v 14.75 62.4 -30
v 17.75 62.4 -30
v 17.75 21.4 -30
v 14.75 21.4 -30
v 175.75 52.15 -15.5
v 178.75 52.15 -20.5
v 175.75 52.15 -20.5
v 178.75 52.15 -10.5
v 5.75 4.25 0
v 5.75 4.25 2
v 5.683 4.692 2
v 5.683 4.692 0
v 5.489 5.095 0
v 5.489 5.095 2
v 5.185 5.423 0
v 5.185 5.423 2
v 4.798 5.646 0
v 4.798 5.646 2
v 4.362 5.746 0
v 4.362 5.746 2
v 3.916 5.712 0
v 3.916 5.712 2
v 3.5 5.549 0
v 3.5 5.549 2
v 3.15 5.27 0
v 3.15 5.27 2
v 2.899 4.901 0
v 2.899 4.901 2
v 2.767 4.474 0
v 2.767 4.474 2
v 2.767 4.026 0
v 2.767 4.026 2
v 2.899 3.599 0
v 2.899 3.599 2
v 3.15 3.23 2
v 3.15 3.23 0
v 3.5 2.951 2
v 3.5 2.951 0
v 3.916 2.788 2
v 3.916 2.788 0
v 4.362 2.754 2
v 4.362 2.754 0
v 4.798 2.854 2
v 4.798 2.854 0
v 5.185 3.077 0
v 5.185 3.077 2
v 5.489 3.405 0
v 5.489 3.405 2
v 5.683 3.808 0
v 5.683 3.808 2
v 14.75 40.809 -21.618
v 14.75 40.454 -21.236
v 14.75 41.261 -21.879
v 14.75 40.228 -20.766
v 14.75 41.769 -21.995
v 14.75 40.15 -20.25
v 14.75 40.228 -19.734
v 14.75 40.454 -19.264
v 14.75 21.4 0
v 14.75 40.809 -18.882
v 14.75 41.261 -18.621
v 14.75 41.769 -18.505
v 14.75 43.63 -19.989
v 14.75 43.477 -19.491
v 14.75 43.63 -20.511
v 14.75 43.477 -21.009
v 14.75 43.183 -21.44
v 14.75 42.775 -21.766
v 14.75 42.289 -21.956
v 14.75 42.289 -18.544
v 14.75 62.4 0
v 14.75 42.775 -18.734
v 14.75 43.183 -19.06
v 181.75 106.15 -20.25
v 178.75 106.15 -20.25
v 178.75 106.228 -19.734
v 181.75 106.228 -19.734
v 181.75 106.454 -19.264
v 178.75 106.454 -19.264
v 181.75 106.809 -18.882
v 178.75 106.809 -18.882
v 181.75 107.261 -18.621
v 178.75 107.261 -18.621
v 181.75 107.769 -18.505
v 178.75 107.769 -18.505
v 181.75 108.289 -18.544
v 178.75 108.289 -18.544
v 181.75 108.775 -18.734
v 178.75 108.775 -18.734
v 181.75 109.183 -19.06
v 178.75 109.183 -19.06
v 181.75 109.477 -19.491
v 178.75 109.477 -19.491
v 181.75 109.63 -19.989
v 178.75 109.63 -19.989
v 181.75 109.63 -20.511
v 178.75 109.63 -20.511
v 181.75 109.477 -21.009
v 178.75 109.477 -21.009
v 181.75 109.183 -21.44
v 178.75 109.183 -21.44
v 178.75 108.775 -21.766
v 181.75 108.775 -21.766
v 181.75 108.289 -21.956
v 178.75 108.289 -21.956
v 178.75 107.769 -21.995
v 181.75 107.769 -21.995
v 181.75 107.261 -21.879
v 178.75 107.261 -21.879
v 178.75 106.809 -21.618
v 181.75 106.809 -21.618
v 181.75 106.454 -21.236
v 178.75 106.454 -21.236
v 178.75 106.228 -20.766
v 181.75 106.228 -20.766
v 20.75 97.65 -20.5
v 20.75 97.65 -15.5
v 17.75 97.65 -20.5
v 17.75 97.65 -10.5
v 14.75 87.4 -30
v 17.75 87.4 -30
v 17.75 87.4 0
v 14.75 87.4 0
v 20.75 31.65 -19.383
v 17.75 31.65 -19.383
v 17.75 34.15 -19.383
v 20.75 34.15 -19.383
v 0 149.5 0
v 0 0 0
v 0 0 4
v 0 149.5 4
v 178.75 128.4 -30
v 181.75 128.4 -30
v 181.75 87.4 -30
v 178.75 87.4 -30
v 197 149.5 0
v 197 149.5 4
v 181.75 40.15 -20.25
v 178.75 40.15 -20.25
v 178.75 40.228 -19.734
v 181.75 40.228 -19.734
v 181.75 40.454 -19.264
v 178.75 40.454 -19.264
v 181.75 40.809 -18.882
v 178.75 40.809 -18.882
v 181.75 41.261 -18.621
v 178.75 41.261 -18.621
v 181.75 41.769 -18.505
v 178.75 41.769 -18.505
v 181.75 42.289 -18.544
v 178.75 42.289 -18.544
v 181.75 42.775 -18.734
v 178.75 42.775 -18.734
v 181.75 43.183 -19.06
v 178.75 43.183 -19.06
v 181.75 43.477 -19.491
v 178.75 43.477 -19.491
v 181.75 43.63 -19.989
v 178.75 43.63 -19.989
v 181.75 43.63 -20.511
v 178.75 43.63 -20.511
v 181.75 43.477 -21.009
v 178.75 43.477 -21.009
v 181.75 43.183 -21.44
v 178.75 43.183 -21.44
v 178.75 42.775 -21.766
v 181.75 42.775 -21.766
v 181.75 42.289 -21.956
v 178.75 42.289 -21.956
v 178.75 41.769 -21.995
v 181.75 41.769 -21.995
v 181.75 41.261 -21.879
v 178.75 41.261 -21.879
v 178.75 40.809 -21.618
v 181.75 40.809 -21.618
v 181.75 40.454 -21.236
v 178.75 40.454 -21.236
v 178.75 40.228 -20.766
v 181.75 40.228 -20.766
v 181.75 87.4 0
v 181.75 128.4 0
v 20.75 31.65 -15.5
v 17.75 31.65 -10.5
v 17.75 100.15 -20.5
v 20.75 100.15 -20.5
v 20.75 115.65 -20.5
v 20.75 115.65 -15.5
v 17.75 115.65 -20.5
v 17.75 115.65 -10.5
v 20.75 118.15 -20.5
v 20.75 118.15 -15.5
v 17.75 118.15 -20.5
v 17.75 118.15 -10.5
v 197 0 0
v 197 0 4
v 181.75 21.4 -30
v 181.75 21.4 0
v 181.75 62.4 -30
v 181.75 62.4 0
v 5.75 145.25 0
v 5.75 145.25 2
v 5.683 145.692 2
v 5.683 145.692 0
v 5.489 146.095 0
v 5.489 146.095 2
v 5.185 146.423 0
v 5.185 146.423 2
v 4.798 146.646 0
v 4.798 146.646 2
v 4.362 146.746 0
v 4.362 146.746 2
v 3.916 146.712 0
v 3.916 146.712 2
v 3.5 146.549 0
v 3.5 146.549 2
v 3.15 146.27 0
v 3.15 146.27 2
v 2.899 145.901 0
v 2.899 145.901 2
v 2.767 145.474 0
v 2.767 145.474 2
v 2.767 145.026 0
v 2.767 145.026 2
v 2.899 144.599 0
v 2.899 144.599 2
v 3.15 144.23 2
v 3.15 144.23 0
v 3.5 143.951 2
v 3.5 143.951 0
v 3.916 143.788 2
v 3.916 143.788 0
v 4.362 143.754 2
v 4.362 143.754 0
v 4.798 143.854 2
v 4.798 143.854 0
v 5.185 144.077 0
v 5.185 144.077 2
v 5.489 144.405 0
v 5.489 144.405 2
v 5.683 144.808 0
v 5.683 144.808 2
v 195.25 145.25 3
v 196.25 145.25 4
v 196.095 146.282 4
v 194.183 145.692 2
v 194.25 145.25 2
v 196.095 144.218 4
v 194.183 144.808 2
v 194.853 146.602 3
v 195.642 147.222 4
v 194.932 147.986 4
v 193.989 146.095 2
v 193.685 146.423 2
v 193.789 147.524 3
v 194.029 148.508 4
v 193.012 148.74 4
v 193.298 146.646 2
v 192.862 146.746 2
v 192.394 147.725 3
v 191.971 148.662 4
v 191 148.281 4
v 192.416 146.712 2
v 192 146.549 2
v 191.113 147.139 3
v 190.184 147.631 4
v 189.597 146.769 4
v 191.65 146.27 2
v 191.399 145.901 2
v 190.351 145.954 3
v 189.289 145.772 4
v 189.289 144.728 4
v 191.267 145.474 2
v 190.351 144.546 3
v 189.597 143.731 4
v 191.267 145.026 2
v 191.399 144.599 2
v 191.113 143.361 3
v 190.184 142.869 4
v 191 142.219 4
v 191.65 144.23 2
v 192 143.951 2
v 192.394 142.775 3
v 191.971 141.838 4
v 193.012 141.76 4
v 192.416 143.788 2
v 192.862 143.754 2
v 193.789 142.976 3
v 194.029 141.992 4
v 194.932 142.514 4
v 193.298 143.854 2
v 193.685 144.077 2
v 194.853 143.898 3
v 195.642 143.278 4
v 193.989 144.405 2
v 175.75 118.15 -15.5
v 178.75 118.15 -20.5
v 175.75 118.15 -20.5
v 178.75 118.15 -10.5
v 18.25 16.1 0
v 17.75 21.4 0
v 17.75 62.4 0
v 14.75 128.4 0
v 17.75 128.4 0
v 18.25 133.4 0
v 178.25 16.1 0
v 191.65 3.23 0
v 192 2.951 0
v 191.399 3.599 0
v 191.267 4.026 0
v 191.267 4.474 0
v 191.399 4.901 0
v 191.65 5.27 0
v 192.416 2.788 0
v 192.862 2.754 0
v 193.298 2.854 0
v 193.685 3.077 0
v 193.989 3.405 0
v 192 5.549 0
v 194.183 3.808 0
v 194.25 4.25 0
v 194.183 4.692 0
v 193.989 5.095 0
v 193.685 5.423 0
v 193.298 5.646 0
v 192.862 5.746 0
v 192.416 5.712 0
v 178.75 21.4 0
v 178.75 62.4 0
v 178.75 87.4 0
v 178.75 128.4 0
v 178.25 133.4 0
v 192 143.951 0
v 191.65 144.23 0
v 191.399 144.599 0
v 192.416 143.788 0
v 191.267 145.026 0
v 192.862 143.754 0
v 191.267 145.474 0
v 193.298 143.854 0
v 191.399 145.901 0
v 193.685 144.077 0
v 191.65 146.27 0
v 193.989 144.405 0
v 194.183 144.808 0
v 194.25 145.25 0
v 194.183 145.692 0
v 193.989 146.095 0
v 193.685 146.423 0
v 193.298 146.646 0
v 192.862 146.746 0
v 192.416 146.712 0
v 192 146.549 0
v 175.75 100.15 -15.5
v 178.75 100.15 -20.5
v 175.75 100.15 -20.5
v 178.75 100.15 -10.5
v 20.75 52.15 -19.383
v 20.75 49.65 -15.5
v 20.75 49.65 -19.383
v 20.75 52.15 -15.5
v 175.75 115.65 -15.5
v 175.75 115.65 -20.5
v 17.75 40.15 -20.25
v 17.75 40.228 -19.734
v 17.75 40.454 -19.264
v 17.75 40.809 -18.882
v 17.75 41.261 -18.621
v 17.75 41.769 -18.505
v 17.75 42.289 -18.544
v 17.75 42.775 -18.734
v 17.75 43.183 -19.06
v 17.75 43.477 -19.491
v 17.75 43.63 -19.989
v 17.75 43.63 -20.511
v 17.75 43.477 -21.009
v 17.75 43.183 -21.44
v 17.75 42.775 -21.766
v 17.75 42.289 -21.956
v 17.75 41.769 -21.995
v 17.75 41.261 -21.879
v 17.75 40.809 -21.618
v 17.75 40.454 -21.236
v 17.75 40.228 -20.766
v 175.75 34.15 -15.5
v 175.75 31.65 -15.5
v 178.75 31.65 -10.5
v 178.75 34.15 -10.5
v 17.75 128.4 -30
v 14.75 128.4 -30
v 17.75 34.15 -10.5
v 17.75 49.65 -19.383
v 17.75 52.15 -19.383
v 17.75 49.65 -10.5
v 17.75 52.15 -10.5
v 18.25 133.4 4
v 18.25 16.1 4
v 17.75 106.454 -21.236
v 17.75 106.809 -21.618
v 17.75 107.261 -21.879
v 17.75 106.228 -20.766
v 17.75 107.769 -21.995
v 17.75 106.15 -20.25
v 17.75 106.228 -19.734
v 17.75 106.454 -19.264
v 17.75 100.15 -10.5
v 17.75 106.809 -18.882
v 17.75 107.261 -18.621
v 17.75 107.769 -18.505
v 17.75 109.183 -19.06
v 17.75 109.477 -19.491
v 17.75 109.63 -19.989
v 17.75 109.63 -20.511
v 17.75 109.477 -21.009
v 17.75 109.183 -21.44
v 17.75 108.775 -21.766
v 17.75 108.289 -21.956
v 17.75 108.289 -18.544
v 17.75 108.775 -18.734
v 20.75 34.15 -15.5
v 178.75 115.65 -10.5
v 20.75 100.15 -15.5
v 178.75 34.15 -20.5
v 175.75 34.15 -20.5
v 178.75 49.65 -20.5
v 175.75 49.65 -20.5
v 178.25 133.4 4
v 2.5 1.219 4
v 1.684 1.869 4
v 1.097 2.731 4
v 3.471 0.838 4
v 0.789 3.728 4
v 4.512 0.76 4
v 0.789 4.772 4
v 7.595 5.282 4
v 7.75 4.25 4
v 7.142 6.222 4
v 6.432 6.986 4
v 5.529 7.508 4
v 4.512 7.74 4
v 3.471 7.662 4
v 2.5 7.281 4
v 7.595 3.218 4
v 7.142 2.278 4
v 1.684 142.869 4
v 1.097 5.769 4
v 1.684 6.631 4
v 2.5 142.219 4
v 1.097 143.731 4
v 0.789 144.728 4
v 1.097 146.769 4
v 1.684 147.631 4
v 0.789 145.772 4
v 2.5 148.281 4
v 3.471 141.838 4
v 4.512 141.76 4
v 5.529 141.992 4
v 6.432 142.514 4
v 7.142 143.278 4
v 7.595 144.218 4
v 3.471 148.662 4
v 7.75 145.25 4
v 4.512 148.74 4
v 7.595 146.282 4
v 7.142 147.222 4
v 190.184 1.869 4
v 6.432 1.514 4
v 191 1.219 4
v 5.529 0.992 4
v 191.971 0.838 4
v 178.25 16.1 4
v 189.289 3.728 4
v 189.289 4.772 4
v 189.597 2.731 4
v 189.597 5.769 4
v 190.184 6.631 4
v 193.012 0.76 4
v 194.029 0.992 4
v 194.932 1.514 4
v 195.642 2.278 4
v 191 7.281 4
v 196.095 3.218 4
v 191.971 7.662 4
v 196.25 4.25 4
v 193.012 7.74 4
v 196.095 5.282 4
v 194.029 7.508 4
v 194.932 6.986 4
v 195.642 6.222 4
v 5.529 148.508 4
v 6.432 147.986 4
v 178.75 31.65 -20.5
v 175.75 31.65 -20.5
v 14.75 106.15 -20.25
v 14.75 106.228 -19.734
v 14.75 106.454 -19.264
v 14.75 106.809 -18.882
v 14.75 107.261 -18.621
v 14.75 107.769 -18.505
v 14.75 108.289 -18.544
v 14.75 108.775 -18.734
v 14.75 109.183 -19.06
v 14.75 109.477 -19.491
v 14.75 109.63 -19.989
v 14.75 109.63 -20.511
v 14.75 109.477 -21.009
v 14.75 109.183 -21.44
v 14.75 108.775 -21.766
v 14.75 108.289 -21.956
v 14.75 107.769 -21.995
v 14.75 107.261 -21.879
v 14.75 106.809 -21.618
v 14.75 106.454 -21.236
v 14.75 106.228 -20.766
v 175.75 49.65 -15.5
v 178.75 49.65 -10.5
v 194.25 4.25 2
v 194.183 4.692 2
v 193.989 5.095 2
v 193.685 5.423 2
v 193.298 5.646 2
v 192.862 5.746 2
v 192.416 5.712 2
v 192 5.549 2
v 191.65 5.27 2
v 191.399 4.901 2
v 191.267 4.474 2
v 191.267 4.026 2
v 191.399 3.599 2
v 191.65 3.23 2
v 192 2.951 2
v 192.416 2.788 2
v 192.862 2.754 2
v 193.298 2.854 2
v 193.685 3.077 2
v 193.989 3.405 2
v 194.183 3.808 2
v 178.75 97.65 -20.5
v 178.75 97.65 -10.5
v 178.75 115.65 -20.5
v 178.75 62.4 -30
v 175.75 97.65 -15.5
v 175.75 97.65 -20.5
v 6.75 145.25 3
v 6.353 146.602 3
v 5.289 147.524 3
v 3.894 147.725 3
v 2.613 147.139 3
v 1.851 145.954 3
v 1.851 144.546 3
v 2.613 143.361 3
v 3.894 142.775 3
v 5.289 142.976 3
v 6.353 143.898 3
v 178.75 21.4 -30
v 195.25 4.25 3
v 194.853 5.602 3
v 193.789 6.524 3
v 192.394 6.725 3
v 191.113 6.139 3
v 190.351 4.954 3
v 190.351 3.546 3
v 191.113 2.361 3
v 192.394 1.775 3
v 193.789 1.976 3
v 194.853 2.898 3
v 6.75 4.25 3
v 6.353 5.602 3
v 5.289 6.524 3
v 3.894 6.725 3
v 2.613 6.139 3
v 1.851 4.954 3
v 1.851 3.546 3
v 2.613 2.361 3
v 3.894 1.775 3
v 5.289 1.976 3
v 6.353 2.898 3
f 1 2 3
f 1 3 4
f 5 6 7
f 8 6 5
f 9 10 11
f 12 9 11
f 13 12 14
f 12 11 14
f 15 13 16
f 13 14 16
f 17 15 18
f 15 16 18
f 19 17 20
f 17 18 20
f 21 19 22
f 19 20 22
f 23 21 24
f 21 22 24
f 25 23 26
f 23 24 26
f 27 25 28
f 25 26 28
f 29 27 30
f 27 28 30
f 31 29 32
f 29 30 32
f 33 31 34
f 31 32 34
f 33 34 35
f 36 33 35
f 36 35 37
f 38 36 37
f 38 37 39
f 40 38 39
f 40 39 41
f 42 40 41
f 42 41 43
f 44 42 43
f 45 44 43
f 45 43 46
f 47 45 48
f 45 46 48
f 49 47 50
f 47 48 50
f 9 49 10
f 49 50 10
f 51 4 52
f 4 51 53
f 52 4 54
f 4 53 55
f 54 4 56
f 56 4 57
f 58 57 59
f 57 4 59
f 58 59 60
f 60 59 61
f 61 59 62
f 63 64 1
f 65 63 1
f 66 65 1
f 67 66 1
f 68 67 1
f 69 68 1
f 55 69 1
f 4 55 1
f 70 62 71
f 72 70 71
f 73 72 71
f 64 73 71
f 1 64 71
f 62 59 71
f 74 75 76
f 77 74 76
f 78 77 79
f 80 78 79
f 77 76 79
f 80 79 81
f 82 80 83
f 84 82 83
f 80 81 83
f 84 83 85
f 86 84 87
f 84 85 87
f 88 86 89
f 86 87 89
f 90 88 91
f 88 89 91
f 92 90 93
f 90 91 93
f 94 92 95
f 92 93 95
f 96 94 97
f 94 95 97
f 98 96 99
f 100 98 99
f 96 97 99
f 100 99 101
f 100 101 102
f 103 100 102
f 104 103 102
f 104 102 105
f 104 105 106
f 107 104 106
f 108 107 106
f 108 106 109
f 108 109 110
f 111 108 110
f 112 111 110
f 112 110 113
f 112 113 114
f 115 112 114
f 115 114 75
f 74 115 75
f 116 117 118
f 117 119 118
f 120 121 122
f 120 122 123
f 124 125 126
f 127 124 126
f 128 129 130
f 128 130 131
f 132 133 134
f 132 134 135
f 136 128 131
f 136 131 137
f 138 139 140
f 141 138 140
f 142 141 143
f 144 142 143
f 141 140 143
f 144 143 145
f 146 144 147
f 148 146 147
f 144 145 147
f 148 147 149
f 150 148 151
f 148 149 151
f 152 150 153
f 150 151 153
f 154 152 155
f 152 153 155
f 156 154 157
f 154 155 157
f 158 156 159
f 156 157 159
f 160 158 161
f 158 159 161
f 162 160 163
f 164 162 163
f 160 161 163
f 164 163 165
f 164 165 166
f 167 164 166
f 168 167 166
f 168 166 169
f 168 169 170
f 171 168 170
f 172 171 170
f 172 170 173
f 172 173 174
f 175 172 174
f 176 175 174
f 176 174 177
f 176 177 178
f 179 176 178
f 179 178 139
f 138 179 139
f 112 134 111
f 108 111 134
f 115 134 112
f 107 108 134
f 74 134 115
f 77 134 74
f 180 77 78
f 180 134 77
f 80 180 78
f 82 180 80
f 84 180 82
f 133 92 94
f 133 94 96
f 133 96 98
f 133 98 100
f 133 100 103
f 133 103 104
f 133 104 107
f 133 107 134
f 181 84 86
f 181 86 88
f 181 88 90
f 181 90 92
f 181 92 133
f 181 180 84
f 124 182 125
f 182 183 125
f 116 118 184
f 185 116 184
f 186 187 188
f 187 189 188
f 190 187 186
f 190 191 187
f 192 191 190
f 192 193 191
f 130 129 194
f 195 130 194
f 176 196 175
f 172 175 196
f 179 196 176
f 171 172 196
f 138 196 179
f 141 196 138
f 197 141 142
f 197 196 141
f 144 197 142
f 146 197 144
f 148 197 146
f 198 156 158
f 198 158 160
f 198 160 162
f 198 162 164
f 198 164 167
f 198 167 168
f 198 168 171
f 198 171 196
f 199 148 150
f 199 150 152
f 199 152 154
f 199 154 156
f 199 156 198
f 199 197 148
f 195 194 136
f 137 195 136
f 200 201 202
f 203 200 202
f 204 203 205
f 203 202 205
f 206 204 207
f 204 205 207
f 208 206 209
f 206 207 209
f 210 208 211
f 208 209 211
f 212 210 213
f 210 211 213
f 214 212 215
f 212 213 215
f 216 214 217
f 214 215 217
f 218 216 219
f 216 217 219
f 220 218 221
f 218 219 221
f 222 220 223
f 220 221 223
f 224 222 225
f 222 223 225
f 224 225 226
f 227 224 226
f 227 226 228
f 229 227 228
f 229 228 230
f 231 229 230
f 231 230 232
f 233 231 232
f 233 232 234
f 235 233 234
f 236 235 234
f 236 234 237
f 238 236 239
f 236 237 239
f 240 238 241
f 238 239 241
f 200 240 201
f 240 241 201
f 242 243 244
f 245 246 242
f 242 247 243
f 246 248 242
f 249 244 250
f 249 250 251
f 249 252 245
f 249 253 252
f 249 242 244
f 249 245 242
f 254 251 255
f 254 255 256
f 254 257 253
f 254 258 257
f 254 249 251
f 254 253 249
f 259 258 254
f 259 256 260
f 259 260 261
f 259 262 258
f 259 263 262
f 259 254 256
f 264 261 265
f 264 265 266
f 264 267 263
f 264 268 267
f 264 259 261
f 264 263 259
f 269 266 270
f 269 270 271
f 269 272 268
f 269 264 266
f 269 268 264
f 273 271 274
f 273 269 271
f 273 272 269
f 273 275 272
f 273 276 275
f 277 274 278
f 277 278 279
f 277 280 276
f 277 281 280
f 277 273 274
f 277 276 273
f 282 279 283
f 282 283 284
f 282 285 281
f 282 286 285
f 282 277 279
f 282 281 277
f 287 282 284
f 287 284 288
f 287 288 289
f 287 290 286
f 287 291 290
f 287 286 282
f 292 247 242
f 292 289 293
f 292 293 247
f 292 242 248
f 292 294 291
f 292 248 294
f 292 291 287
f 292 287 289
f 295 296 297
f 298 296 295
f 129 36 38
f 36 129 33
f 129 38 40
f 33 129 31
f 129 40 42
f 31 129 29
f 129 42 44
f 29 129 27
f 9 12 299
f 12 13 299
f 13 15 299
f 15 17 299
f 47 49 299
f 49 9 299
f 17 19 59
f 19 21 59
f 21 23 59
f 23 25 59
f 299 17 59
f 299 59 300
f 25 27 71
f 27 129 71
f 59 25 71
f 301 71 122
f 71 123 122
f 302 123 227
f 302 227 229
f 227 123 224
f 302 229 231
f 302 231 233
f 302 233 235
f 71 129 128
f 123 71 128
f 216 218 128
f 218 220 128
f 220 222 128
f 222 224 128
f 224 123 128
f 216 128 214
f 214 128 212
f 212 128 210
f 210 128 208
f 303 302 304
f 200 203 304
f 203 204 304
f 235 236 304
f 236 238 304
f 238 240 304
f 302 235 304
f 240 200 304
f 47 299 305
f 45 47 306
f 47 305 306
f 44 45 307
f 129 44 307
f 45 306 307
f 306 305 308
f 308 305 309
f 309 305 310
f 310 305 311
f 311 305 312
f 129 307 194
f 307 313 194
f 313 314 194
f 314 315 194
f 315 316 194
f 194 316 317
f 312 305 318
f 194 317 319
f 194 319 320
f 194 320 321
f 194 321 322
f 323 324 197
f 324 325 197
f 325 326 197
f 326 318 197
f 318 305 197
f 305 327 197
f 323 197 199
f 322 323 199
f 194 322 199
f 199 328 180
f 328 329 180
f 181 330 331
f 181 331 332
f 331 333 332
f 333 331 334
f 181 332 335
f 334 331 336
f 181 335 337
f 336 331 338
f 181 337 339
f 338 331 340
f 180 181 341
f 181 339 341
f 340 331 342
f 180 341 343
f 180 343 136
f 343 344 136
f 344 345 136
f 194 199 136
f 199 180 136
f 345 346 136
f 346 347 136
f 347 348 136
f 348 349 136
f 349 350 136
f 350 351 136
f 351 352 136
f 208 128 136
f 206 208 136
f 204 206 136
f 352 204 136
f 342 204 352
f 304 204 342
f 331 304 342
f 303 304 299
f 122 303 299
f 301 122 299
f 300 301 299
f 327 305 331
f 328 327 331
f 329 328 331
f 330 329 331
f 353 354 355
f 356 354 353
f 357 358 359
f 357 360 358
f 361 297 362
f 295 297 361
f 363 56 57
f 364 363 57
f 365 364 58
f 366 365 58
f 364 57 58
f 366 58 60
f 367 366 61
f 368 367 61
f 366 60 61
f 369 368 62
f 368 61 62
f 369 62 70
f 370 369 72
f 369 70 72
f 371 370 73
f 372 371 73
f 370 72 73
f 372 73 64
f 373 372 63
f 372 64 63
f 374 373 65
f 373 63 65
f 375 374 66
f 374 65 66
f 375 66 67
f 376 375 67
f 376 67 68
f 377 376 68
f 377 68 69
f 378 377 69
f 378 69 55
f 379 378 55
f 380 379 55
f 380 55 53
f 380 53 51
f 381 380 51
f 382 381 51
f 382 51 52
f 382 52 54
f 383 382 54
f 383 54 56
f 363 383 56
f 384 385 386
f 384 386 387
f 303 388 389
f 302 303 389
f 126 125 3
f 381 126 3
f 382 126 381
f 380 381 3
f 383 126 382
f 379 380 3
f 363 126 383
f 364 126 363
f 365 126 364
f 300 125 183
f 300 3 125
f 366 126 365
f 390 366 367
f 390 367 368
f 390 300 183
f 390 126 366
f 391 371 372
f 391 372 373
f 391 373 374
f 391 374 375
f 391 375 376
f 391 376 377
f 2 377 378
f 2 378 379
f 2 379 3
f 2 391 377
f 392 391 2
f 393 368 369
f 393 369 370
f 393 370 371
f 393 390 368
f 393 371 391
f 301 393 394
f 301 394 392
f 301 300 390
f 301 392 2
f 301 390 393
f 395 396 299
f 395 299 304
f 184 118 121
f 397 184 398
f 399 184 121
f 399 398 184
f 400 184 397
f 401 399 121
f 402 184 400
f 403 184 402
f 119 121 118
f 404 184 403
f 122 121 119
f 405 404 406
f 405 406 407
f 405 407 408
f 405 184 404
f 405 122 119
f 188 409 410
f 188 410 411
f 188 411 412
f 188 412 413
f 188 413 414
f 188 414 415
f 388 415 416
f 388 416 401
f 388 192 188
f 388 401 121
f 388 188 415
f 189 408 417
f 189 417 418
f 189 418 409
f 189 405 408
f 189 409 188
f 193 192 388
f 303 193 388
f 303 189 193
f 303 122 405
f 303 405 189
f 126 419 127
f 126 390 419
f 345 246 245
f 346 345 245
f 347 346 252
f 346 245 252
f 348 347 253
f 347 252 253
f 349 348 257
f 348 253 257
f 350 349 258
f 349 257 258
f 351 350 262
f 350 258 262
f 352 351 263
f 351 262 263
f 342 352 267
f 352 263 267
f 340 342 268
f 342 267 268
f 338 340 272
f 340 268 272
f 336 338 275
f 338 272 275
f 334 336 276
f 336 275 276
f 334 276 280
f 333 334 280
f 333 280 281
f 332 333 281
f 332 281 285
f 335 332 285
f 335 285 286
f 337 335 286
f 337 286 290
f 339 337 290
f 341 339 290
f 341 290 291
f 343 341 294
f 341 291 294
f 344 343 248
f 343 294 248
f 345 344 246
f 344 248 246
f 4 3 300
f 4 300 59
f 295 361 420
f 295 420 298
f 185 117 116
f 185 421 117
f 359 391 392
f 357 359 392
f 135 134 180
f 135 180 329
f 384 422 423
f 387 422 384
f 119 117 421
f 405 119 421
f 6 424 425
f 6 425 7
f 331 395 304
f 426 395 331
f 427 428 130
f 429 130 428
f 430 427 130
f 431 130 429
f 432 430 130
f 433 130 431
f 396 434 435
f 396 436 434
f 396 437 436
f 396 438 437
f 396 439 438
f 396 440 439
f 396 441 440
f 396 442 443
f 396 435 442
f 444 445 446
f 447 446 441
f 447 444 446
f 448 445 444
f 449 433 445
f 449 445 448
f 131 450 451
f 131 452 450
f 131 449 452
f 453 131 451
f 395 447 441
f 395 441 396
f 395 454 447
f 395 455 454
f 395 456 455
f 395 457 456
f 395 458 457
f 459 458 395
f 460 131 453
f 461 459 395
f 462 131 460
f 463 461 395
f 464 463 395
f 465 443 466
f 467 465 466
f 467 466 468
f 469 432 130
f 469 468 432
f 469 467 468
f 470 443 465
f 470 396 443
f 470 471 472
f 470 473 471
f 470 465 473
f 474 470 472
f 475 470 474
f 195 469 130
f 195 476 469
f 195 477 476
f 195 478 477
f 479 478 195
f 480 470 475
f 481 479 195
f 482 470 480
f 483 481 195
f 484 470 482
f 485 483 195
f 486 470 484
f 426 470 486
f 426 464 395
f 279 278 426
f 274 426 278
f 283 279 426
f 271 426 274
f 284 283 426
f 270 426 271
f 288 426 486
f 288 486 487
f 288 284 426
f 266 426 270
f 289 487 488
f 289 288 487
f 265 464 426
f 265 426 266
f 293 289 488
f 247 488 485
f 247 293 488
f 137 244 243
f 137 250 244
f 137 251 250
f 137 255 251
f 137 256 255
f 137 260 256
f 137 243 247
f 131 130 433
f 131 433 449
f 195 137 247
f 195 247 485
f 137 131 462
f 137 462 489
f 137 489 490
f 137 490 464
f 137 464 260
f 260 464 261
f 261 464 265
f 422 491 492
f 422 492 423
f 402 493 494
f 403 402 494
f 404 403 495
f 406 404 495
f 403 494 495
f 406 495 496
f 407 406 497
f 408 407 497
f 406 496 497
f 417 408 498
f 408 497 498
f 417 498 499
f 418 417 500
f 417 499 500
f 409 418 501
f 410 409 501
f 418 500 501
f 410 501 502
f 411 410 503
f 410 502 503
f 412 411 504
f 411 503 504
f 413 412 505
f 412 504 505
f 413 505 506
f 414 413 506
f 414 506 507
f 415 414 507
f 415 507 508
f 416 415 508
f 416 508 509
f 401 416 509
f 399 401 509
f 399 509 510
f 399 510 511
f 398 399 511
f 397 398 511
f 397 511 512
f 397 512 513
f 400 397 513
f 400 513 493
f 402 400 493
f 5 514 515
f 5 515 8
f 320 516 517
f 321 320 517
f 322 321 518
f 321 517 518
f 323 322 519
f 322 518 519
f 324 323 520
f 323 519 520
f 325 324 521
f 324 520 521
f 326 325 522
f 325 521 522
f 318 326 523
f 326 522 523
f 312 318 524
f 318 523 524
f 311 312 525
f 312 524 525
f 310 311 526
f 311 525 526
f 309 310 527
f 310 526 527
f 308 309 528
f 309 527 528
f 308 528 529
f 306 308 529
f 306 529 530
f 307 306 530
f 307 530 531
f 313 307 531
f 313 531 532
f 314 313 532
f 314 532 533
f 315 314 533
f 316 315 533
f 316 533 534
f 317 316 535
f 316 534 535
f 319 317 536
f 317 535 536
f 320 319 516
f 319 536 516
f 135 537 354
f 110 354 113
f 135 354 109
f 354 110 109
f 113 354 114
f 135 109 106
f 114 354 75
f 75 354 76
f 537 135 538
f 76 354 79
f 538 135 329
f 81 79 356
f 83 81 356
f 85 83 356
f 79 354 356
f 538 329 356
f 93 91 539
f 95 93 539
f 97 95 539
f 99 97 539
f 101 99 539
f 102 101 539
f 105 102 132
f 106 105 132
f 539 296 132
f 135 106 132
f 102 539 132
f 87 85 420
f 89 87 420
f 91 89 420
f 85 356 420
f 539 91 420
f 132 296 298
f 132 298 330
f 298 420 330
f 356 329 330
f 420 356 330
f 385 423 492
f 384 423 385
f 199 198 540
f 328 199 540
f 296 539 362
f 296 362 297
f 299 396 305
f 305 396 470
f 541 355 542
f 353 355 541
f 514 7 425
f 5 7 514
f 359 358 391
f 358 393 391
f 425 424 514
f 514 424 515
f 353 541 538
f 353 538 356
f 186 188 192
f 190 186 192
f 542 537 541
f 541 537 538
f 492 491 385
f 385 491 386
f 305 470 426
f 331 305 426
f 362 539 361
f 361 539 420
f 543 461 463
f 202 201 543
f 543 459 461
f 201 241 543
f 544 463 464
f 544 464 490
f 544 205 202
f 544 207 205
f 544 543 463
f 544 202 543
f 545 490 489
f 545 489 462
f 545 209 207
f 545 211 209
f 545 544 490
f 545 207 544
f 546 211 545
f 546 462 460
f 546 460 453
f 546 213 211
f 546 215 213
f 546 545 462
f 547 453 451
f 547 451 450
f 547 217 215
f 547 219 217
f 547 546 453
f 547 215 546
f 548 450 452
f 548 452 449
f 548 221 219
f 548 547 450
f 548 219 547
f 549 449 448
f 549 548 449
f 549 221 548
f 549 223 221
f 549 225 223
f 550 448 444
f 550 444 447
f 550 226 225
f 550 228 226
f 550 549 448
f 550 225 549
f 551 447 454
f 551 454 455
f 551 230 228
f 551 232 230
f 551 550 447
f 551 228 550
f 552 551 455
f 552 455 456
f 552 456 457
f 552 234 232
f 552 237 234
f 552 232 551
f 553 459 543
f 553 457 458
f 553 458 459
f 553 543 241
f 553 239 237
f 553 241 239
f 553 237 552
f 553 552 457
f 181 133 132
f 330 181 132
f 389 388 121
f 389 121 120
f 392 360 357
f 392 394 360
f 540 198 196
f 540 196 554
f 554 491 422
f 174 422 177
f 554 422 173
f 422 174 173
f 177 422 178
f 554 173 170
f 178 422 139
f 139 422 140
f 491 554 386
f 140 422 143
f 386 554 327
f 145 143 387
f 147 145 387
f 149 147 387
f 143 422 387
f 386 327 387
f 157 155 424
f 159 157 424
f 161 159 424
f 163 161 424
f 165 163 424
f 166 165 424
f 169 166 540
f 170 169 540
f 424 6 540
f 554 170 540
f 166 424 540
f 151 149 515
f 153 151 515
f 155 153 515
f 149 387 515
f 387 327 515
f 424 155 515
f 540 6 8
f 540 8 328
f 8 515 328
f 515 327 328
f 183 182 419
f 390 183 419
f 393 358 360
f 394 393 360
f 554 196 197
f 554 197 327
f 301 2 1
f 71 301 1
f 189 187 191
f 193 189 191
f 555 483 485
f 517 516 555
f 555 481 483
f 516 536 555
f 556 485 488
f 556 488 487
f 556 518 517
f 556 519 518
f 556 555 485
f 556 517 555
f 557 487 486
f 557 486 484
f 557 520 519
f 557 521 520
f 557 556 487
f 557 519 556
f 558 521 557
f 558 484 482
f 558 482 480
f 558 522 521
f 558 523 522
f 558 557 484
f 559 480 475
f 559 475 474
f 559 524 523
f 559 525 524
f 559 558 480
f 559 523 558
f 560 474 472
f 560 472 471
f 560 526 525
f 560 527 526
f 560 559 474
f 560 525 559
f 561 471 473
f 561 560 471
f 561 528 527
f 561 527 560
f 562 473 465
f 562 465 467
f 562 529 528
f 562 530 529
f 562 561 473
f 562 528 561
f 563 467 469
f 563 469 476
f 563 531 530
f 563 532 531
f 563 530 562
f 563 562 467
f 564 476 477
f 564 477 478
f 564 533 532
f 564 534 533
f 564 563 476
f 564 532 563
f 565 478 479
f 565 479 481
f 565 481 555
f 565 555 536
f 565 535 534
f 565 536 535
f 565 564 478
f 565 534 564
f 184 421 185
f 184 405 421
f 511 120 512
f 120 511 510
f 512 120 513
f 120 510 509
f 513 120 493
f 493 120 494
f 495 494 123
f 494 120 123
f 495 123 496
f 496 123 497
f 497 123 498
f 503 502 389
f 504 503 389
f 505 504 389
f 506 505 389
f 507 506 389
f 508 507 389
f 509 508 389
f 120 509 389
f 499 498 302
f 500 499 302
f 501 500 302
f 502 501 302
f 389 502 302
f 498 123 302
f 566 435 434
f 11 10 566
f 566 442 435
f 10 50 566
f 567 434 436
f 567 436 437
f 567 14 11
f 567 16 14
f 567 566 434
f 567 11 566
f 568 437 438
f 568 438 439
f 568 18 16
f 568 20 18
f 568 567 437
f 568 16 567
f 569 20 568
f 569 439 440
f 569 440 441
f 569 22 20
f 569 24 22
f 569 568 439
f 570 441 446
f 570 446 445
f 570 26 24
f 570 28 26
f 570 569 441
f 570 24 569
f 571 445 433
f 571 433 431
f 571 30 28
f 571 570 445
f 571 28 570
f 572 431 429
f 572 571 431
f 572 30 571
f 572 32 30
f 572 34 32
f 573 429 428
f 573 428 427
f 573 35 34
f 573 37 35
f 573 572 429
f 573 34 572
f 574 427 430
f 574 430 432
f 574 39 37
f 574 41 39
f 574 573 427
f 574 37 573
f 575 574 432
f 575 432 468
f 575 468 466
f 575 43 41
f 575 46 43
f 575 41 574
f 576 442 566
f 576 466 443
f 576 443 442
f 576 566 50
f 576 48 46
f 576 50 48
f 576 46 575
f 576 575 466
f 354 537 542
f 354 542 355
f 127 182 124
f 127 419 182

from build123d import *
from OCP.BRepFilletAPI import BRepFilletAPI_MakeChamfer

# Parameters (mm, degrees)
ESQUISSE1_W             = 197
ESQUISSE1_H             = 149.5
BOSS_EXTRU_1_DEPTH      = 4
ESQUISSE3_R             = 1.5
ENL_V_MAT_EXTRU_2_DEPTH = 4
CHANFREIN1_SIZE         = 2
ESQUISSE4_W             = 160
ESQUISSE4_H             = 117.3
ENL_V_MAT_EXTRU_3_DEPTH = 10
ESQUISSE5_W             = 3
ESQUISSE5_H             = 41
BOSS_EXTRU_2_DEPTH      = 30
ESQUISSE6_W             = 10
ESQUISSE6_H             = 2.5
ESQUISSE6_W_2           = 8.882781921
BOSS_EXTRU_3_DEPTH      = 3
ESQUISSE7_W             = 10
ESQUISSE7_H             = 2.5
BOSS_EXTRU_4_DEPTH      = 3
CHANFREIN2_SIZE         = 3
CHANFREIN2_SIZE_2       = 5
ESQUISSE8_R             = 1.75
ENL_V_MAT_EXTRU_4_DEPTH = 210


with BuildPart() as part:
    # Esquisse1 → Boss.-Extru.1 (new body)
    with BuildSketch(Plane.XY):
        with Locations((98.5, 74.75)):
            Rectangle(ESQUISSE1_W, ESQUISSE1_H)
    extrude(amount=BOSS_EXTRU_1_DEPTH)

    # Esquisse3 → Enlèv. mat.-Extru.2 (cut)
    with BuildSketch(Plane.XY.offset(4)):
        with Locations((4.25, 145.25)):
            Circle(ESQUISSE3_R)
        with Locations((4.25, 4.25)):
            Circle(ESQUISSE3_R)
        with Locations((192.75, 4.25)):
            Circle(ESQUISSE3_R)
        with Locations((192.75, 145.25)):
            Circle(ESQUISSE3_R)
    extrude(amount=-ENL_V_MAT_EXTRU_2_DEPTH, mode=Mode.SUBTRACT)

    # Chanfrein1
    chanfrein1_edges = [part.edges().sort_by_distance(p)[0] for p in [
        (2.75, 145.25, 4),
        (2.75, 4.25, 4),
        (191.25, 4.25, 4),
        (191.25, 145.25, 4),
    ]]
    chamfer(chanfrein1_edges, length=CHANFREIN1_SIZE)

    # Esquisse4 → Enlèv. mat.-Extru.3 (cut)
    with BuildSketch(Plane.XY.offset(4)):
        with Locations((98.25, 74.75)):
            Rectangle(ESQUISSE4_W, ESQUISSE4_H)
    extrude(amount=-ENL_V_MAT_EXTRU_3_DEPTH, mode=Mode.SUBTRACT)

    # Esquisse5 → Boss.-Extru.2 (add)
    with BuildSketch(Plane(origin=(0, 0, 0), x_dir=(-1, 0, 0), z_dir=(0, 0, -1))):
        with Locations((-180.25, 107.9)):
            Rectangle(ESQUISSE5_W, ESQUISSE5_H)
        with Locations((-180.25, 41.9)):
            Rectangle(ESQUISSE5_W, ESQUISSE5_H)
        with Locations((-16.25, 107.9)):
            Rectangle(ESQUISSE5_W, ESQUISSE5_H)
        with Locations((-16.25, 41.9)):
            Rectangle(ESQUISSE5_W, ESQUISSE5_H)
    extrude(amount=BOSS_EXTRU_2_DEPTH)

    # Esquisse6 → Boss.-Extru.3 (add)
    with BuildSketch(Plane(origin=(17.75, 0, 0), x_dir=(0, 0, -1), z_dir=(1, 0, 0))):
        with Locations((15.5, 116.9)):
            Rectangle(ESQUISSE6_W, ESQUISSE6_H)
        with Locations((15.5, 98.9)):
            Rectangle(ESQUISSE6_W, ESQUISSE6_H)
        with Locations((14.941390961, 50.9)):
            Rectangle(ESQUISSE6_W_2, ESQUISSE6_H)
        with Locations((14.941390961, 32.9)):
            Rectangle(ESQUISSE6_W_2, ESQUISSE6_H)
    extrude(amount=BOSS_EXTRU_3_DEPTH)

    # Esquisse7 → Boss.-Extru.4 (add)
    with BuildSketch(Plane.ZY.offset(-178.75)):
        with Locations((-15.5, 32.9)):
            Rectangle(ESQUISSE7_W, ESQUISSE7_H)
        with Locations((-15.5, 50.9)):
            Rectangle(ESQUISSE7_W, ESQUISSE7_H)
        with Locations((-15.5, 98.9)):
            Rectangle(ESQUISSE7_W, ESQUISSE7_H)
        with Locations((-15.5, 116.9)):
            Rectangle(ESQUISSE7_W, ESQUISSE7_H)
    extrude(amount=BOSS_EXTRU_4_DEPTH)

    # Chanfrein2
    chanfrein2_edges_1 = [part.edges().sort_by_distance(p)[0] for p in [
        (20.75, 98.9, -10.5),
    ]]
    chanfrein2_side_1 = [part.faces().sort_by_distance(p)[0] for p in [
        (20.69, 98.9, -10.5),
    ]]
    chanfrein2_edges_2 = [part.edges().sort_by_distance(p)[0] for p in [
        (20.75, 116.9, -10.5),
    ]]
    chanfrein2_side_2 = [part.faces().sort_by_distance(p)[0] for p in [
        (20.69, 116.9, -10.5),
    ]]
    chanfrein2_edges_3 = [part.edges().sort_by_distance(p)[0] for p in [
        (20.75, 32.9, -10.5),
    ]]
    chanfrein2_side_3 = [part.faces().sort_by_distance(p)[0] for p in [
        (20.69, 32.9, -10.5),
    ]]
    chanfrein2_edges_4 = [part.edges().sort_by_distance(p)[0] for p in [
        (20.75, 50.9, -10.5),
    ]]
    chanfrein2_side_4 = [part.faces().sort_by_distance(p)[0] for p in [
        (20.69, 50.9, -10.5),
    ]]
    chanfrein2_edges_5 = [part.edges().sort_by_distance(p)[0] for p in [
        (175.75, 116.9, -10.5),
    ]]
    chanfrein2_side_5 = [part.faces().sort_by_distance(p)[0] for p in [
        (175.81, 116.9, -10.5),
    ]]
    chanfrein2_edges_6 = [part.edges().sort_by_distance(p)[0] for p in [
        (175.75, 98.9, -10.5),
    ]]
    chanfrein2_side_6 = [part.faces().sort_by_distance(p)[0] for p in [
        (175.81, 98.9, -10.5),
    ]]
    chanfrein2_edges_7 = [part.edges().sort_by_distance(p)[0] for p in [
        (175.75, 50.9, -10.5),
    ]]
    chanfrein2_side_7 = [part.faces().sort_by_distance(p)[0] for p in [
        (175.81, 50.9, -10.5),
    ]]
    chanfrein2_edges_8 = [part.edges().sort_by_distance(p)[0] for p in [
        (175.75, 32.9, -10.5),
    ]]
    chanfrein2_side_8 = [part.faces().sort_by_distance(p)[0] for p in [
        (175.81, 32.9, -10.5),
    ]]
    chanfrein2 = BRepFilletAPI_MakeChamfer(part.part.solid().wrapped)
    for e in chanfrein2_edges_1:
        chanfrein2.Add(CHANFREIN2_SIZE - 0.0001, CHANFREIN2_SIZE_2 - 0.0001, e.wrapped, chanfrein2_side_1[0].wrapped)
    for e in chanfrein2_edges_2:
        chanfrein2.Add(CHANFREIN2_SIZE - 0.0001, CHANFREIN2_SIZE_2 - 0.0001, e.wrapped, chanfrein2_side_2[0].wrapped)
    for e in chanfrein2_edges_3:
        chanfrein2.Add(CHANFREIN2_SIZE - 0.0001, CHANFREIN2_SIZE_2 - 0.0001, e.wrapped, chanfrein2_side_3[0].wrapped)
    for e in chanfrein2_edges_4:
        chanfrein2.Add(CHANFREIN2_SIZE - 0.0001, CHANFREIN2_SIZE_2 - 0.0001, e.wrapped, chanfrein2_side_4[0].wrapped)
    for e in chanfrein2_edges_5:
        chanfrein2.Add(CHANFREIN2_SIZE - 0.0001, CHANFREIN2_SIZE_2 - 0.0001, e.wrapped, chanfrein2_side_5[0].wrapped)
    for e in chanfrein2_edges_6:
        chanfrein2.Add(CHANFREIN2_SIZE - 0.0001, CHANFREIN2_SIZE_2 - 0.0001, e.wrapped, chanfrein2_side_6[0].wrapped)
    for e in chanfrein2_edges_7:
        chanfrein2.Add(CHANFREIN2_SIZE - 0.0001, CHANFREIN2_SIZE_2 - 0.0001, e.wrapped, chanfrein2_side_7[0].wrapped)
    for e in chanfrein2_edges_8:
        chanfrein2.Add(CHANFREIN2_SIZE - 0.0001, CHANFREIN2_SIZE_2 - 0.0001, e.wrapped, chanfrein2_side_8[0].wrapped)
    add(Compound.cast(chanfrein2.Shape()), mode=Mode.REPLACE)  # a hair under: the kernel refuses the full size

    # Esquisse8 → Enlèv. mat.-Extru.4 (cut)
    with BuildSketch(Plane.ZY.offset(-14.75)):
        with Locations(Location((-20.25, 107.9, 0), (0, 0, 270))):
            Circle(ESQUISSE8_R)
        with Locations(Location((-20.25, 41.9, 0), (0, 0, 270))):
            Circle(ESQUISSE8_R)
    extrude(amount=-ENL_V_MAT_EXTRU_4_DEPTH, mode=Mode.SUBTRACT)


solid = part.part
